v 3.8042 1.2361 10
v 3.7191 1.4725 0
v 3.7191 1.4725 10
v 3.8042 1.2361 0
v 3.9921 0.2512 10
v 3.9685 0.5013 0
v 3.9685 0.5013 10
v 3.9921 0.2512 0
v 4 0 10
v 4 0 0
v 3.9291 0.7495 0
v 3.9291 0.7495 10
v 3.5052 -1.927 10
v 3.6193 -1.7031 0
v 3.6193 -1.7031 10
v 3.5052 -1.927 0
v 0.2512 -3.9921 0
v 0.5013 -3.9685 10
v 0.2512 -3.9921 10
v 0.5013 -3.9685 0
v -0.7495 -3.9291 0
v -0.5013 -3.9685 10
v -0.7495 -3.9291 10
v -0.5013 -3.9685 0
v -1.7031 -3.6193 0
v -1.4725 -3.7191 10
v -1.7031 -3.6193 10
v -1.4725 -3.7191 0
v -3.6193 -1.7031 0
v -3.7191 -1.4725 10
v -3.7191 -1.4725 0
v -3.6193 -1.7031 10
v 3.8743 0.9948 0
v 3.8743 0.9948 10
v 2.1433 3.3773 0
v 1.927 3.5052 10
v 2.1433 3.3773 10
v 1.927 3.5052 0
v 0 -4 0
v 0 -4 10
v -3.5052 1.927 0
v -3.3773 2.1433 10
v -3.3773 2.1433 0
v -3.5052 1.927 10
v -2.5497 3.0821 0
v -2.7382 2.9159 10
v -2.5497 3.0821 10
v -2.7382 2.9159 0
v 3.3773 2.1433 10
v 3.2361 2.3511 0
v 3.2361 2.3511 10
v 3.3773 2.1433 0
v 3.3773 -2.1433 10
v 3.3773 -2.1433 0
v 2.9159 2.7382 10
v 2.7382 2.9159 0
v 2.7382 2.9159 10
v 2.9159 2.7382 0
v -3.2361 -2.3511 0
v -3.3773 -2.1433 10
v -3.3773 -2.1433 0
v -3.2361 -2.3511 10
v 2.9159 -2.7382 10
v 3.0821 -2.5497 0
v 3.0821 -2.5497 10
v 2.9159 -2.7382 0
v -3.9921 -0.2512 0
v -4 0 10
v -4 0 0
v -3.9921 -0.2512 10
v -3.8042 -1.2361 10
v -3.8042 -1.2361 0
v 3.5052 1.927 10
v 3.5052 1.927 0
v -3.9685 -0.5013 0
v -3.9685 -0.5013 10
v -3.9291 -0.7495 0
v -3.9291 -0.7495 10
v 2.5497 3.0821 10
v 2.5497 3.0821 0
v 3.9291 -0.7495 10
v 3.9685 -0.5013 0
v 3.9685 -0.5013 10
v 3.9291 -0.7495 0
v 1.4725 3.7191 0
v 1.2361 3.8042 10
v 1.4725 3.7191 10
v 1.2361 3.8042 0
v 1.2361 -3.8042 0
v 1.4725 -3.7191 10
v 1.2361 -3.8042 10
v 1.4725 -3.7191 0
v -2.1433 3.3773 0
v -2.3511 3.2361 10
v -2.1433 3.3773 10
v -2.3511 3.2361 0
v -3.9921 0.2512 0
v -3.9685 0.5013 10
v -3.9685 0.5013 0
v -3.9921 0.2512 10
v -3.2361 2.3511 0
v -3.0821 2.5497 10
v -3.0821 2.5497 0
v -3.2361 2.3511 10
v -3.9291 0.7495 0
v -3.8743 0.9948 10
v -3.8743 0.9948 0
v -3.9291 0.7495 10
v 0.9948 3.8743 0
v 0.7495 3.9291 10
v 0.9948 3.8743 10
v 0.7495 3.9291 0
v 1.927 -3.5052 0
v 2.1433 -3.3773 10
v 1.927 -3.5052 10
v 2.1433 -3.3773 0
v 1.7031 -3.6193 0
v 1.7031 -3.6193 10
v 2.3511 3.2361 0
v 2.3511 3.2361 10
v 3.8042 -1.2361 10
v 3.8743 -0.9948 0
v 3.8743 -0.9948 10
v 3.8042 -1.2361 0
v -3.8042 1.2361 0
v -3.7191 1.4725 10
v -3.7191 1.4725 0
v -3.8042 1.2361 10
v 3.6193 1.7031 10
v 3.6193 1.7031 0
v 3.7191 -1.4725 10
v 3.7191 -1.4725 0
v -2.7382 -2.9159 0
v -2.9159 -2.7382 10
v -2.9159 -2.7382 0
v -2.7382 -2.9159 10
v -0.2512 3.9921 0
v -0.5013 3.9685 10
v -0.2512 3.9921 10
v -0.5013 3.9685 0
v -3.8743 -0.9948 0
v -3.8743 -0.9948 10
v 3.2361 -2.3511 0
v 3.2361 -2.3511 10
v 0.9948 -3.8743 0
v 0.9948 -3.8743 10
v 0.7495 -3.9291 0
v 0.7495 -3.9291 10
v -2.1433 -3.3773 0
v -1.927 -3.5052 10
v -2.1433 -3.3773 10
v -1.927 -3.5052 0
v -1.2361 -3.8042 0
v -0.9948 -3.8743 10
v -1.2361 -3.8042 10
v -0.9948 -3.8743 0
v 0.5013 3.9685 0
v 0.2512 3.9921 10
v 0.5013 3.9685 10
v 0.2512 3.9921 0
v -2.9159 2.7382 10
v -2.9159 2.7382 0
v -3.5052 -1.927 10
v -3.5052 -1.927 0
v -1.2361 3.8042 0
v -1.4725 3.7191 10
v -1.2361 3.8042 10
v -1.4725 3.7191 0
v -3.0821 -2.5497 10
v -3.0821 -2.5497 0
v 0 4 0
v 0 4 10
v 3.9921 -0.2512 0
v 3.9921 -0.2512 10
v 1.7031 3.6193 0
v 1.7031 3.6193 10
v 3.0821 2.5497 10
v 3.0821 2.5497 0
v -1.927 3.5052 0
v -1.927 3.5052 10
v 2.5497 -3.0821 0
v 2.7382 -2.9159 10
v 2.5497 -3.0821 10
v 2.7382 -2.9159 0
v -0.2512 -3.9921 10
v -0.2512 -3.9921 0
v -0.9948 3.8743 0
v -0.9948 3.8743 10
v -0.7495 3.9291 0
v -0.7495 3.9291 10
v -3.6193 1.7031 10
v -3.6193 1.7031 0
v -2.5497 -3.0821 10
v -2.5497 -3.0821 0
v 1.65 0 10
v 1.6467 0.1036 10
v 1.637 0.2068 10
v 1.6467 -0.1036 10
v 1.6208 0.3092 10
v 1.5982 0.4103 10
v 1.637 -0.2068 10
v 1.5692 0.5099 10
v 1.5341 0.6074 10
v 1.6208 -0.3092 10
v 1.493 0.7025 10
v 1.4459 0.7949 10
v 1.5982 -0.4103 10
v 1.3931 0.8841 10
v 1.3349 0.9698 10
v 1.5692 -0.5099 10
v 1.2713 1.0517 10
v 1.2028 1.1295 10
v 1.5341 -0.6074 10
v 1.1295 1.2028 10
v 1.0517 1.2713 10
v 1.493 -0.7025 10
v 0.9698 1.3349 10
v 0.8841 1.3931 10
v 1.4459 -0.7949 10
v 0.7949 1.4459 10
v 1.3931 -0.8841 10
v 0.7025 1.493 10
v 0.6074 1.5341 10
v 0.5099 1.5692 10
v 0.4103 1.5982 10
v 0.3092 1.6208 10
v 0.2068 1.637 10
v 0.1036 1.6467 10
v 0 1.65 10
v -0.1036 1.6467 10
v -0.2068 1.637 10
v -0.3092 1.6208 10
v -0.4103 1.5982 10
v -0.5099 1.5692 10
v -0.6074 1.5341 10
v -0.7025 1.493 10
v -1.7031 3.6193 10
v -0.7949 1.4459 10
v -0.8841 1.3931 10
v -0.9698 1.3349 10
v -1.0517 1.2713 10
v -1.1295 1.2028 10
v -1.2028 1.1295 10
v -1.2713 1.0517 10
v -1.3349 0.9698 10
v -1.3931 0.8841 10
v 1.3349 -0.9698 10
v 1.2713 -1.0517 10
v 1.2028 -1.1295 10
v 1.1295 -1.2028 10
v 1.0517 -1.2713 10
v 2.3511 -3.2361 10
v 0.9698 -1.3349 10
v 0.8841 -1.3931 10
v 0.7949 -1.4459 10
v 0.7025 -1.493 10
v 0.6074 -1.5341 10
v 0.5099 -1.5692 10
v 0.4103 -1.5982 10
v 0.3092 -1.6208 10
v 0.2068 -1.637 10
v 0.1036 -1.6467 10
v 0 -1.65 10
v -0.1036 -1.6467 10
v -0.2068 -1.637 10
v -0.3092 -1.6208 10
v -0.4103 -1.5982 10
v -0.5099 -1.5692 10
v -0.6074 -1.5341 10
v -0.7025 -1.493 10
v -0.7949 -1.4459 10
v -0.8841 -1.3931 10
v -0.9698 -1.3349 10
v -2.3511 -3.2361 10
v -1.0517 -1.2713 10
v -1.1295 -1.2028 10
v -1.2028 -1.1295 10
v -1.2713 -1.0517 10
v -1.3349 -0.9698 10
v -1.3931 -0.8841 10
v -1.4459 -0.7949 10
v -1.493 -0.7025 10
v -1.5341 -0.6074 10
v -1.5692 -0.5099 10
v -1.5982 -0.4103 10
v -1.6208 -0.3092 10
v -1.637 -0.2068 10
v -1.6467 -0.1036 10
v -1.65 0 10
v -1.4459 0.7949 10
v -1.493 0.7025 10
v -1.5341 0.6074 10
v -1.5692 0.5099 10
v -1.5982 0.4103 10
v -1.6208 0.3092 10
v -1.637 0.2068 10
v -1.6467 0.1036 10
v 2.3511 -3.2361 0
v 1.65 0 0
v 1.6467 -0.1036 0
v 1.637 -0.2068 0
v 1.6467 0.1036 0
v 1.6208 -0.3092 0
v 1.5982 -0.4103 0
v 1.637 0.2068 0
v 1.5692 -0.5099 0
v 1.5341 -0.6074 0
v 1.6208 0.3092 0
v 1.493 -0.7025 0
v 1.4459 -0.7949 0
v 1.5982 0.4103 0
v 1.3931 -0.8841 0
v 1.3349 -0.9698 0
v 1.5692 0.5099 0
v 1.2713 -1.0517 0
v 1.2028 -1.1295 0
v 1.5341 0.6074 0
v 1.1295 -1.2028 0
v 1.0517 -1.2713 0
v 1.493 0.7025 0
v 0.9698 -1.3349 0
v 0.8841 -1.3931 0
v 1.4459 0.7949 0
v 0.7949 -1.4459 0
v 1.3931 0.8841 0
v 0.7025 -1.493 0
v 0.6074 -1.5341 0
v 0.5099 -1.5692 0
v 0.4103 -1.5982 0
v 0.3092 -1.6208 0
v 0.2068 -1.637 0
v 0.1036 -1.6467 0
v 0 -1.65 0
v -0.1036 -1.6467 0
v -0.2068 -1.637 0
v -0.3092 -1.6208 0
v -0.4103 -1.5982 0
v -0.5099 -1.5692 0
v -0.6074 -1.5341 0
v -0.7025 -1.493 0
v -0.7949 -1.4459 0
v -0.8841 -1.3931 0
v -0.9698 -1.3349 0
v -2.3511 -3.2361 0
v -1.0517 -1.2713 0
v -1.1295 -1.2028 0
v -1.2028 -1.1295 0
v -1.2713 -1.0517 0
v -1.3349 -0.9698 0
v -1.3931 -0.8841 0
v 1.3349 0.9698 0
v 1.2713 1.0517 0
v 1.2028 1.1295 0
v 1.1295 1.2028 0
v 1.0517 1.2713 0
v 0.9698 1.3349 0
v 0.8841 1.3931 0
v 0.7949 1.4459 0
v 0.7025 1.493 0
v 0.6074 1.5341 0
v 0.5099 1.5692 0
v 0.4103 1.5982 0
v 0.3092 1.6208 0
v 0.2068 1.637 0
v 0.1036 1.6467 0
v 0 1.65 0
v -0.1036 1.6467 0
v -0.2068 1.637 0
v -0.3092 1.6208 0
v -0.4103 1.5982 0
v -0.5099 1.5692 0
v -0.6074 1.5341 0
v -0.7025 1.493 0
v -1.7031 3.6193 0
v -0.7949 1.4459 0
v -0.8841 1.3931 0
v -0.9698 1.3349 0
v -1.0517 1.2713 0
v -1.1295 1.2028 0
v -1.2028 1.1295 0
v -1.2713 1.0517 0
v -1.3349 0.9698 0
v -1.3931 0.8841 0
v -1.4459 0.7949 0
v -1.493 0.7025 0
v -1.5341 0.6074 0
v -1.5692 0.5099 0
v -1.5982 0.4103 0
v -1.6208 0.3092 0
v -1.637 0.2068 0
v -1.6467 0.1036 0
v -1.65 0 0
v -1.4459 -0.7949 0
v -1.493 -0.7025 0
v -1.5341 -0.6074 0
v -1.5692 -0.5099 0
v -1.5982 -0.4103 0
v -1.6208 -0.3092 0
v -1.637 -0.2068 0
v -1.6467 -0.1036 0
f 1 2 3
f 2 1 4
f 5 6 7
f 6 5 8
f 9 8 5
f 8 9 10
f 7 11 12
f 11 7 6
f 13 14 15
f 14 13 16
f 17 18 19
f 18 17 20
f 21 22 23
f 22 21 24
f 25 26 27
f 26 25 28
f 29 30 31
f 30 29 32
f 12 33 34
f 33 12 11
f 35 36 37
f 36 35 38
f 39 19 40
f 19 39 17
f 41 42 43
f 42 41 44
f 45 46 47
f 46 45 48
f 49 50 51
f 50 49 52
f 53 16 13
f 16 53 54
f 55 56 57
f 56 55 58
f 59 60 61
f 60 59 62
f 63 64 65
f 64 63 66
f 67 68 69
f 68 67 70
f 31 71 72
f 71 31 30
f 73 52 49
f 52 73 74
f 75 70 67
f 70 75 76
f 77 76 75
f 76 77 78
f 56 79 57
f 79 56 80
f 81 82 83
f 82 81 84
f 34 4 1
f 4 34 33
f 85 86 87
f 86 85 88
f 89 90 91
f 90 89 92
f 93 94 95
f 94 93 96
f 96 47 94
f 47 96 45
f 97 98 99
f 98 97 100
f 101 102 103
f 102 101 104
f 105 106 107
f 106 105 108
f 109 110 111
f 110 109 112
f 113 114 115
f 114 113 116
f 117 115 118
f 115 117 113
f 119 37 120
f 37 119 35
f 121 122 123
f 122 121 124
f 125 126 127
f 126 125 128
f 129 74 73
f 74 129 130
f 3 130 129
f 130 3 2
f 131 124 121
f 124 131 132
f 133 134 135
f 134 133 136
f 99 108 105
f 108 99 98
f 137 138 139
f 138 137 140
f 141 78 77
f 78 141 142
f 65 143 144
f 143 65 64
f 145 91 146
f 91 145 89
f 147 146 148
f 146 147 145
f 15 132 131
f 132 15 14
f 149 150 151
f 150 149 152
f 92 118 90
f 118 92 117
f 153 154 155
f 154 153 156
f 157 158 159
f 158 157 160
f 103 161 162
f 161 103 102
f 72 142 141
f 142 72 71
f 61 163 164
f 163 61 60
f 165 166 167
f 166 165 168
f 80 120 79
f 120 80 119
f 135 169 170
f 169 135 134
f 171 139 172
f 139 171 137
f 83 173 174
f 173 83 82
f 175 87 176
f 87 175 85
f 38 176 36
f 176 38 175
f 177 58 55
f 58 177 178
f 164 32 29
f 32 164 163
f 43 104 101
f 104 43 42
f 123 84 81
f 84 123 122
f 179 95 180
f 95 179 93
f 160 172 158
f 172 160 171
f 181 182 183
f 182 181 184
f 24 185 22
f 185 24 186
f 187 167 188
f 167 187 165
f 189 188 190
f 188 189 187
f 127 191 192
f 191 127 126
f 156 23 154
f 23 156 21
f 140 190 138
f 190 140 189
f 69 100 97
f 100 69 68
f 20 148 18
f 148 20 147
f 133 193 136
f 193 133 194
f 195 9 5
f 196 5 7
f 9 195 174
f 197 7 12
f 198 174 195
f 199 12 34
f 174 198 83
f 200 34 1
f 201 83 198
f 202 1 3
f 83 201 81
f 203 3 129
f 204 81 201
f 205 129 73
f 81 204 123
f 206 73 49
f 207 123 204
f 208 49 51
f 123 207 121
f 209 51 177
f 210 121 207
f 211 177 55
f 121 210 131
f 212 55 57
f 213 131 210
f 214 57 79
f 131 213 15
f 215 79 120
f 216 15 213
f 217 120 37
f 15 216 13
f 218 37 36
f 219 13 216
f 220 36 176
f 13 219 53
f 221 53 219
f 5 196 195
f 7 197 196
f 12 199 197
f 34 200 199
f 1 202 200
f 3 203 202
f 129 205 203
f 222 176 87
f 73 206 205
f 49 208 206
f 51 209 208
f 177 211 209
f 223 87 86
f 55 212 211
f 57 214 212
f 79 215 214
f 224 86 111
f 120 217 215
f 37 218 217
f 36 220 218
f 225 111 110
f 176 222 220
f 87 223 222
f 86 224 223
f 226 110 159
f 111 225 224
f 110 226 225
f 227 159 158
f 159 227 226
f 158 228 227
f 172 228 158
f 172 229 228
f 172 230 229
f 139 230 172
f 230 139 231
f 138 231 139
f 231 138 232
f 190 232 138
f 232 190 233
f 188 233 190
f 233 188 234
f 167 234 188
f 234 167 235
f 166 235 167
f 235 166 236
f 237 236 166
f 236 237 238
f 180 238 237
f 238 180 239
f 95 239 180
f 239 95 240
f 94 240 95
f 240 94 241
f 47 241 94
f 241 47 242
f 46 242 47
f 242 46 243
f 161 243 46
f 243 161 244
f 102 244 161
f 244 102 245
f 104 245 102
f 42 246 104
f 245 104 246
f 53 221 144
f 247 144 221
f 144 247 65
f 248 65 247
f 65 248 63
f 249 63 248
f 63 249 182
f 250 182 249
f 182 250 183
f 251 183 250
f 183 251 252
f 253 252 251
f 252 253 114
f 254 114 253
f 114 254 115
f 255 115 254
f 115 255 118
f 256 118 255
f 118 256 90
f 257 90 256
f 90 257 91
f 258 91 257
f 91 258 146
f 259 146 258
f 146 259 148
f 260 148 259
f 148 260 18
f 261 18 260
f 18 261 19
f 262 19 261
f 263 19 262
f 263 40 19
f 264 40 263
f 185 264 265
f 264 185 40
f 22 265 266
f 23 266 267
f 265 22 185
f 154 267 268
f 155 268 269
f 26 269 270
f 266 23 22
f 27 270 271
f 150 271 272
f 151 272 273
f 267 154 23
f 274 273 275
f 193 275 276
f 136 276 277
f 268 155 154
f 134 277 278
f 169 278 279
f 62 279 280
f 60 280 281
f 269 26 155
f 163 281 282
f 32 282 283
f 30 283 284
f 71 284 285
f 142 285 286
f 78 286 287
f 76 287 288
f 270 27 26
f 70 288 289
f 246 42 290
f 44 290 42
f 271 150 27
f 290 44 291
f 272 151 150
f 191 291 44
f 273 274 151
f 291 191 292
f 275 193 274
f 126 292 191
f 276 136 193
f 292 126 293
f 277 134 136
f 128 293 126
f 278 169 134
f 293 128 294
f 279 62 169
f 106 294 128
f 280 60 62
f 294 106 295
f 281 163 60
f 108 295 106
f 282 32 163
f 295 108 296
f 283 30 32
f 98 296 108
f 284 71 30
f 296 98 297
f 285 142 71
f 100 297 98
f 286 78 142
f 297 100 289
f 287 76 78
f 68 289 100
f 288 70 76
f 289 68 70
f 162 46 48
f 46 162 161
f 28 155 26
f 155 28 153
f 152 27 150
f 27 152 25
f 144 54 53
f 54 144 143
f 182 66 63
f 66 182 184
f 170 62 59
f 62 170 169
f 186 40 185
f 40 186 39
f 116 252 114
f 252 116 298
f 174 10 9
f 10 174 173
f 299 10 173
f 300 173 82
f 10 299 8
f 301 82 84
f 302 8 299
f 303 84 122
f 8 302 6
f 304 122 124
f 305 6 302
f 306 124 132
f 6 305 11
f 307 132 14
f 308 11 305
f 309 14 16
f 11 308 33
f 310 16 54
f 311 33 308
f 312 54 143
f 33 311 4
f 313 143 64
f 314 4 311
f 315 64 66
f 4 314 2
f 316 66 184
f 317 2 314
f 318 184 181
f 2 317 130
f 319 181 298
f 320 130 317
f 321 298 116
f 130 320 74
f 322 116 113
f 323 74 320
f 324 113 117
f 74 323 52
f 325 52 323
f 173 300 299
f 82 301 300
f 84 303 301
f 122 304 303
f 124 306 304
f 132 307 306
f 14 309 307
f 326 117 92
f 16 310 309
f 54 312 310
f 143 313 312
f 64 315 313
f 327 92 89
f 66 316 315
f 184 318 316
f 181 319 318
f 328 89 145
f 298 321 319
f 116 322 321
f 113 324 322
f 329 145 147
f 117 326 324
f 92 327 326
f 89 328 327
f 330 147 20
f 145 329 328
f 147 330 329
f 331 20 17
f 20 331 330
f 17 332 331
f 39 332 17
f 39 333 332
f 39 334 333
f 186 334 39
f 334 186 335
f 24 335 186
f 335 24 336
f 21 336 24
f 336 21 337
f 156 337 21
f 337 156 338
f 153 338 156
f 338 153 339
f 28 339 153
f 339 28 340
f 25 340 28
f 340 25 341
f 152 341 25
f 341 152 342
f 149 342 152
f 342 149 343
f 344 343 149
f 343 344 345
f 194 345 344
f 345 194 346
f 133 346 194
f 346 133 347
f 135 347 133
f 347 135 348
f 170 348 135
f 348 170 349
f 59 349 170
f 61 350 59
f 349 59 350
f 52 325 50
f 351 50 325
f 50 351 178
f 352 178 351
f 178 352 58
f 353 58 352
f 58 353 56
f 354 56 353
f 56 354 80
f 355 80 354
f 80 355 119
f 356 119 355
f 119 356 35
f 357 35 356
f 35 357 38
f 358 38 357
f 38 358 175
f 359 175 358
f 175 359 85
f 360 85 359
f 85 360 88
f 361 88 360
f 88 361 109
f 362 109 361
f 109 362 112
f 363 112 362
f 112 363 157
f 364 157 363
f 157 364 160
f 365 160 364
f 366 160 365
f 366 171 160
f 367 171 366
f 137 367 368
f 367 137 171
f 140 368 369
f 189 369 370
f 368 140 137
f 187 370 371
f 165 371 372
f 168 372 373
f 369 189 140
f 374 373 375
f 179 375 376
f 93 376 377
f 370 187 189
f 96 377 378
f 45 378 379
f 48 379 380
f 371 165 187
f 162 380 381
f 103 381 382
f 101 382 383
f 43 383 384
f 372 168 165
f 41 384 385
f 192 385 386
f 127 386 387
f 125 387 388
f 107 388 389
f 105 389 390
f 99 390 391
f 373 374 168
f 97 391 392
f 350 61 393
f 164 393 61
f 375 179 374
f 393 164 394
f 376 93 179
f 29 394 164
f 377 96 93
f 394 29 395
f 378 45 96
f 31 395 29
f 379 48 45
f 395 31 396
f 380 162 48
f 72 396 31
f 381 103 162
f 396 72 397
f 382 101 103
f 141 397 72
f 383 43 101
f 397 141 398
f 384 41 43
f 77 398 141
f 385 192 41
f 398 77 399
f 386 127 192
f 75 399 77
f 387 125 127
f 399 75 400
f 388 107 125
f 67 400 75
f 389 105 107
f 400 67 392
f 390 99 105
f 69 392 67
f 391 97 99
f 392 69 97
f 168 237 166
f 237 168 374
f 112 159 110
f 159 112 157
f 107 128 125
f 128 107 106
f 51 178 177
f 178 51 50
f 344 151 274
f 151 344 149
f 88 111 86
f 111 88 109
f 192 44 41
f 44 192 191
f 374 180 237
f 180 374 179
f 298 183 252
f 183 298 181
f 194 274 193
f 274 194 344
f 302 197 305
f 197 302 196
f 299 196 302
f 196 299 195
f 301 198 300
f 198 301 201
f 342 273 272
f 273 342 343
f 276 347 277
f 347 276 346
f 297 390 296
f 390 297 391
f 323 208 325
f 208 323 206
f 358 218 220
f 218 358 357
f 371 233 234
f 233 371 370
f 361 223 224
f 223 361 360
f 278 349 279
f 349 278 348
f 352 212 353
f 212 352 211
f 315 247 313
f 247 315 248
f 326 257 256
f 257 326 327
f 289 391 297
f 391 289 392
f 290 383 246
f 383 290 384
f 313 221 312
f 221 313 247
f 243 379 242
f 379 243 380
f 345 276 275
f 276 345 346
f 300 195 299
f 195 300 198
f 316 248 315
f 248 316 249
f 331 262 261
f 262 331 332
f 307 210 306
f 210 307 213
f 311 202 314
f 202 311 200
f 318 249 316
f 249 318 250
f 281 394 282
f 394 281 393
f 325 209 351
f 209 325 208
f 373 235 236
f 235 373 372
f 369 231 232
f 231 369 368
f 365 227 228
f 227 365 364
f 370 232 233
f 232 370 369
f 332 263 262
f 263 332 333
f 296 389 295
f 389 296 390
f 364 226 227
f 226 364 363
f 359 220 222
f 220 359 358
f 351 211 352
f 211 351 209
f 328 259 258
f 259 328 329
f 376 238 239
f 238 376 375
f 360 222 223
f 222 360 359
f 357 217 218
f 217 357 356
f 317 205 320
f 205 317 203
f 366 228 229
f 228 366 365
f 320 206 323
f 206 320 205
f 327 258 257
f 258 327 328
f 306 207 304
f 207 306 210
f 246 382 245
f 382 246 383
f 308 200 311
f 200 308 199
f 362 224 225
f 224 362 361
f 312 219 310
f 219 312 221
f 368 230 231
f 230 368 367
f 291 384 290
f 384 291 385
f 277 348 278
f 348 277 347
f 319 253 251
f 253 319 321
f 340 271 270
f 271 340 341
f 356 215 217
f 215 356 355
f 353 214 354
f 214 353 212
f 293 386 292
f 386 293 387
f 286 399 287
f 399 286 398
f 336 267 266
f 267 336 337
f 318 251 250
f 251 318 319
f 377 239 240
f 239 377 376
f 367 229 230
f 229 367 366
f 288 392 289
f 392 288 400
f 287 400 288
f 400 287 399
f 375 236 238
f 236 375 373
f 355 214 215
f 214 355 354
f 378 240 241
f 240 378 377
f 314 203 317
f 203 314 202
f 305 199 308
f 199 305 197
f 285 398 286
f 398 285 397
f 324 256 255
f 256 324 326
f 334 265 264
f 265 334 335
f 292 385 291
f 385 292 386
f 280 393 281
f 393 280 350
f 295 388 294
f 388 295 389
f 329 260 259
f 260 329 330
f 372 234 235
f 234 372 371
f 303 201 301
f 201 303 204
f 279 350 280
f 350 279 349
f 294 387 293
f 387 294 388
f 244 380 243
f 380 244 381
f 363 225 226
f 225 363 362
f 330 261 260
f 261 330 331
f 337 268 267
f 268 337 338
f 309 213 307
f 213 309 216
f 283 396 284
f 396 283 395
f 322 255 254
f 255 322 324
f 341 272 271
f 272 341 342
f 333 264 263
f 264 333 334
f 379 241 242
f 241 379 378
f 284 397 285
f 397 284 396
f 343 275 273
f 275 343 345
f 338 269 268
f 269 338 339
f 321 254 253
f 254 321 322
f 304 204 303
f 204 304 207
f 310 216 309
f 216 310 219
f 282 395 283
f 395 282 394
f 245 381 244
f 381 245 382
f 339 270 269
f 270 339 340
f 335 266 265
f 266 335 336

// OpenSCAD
// [FL_INDEX: keywords="openscad, 3d_parametric, PCB_Stand_Off_Library, csg_solid" | COT="Parametric OpenSCAD design from 3DCodeverse"]
// Title: PCB Stand Off Library

//simple pcb standoff library - By the DoomMeister

/*
Types will be through hole, captured nut, split column (with and without base)

v1 - First Release
v1.1 - Tidied Split Base
v1.2 - added support for end nut
v1.3 - Cleaned up a bit, allowing it to be used as both a customizer object and OpenSCAD library without changes (Marius Kintel <marius@kintel.net>)

This program is free software: you can redistribute it and/or modify
it under the terms of the GNU General Public License as published by
the Free Software Foundation, either version 3 of the License, or
(at your option) any later version.

This program is distributed in the hope that it will be useful,
but WITHOUT ANY WARRANTY; without even the implied warranty of
MERCHANTABILITY or FITNESS FOR A PARTICULAR PURPOSE. See the
GNU General Public License for more details.

You should have received a copy of the GNU General Public License
along with this program. If not, see <http://www.gnu.org/licenses/>.
*/

include<MCAD/metric_fastners.scad>

//>>>>>>>>>>>>>>>>>>>>>>>>>>>>>>>>>>>>>>>>>>>>>>>>>>>>>>>>>>>>>>>>>>>>>>>>>>>
//usage
//>>>>>>>>>>>>>>>>>>>>>>>>>>>>>>>>>>>>>>>>>>>>>>>>>>>>>>>>>>>>>>>>>>>>>>>>>>>
/*
pcb_stand_off(
              type="plain",  THIS IS THE TYPE OF STAND OFF plain, end_nut, split_base 
	      hex=true, 		THIS IS THE OUTSIDE SHAPE IS IT HEXAGONAL OR ROUND,NOT USED ON SPLIT TYPE
	      od = 10, 		OUTSIDE DIAMETER
	      id = 3,        THREAD SIZE FOR INNER DIAMETER, HOLE SIZE FOR SPLIT TYPE
	      len = 12, 		LENGTH, SUPPORT HEIGHT FOR SPLIT TYPE
	      cl=0.3,  		CLEARANCE
	      thk_base,		BASE THICKNESS FOR SPLIT TYPE
	      thk_pcb);		PCB THICKNESS
*/

//>>>>>>>>>>>>>>>>>>>>>>>>>>>>>>>>>>>>>>>>>>>>>>>>>>>>>>>>>>>>>>>>>>>>>>>>>>>
//Customiser Stuff
//>>>>>>>>>>>>>>>>>>>>>>>>>>>>>>>>>>>>>>>>>>>>>>>>>>>>>>>>>>>>>>>>>>>>>>>>>>>

//Plain, Retained Nut or Split Pillar With Base
Stand_Off_Type = "plain"; // [plain:Plain, end_nut:Captive Nut, split_base:Screwless]
//Round or Hex Outside
Outside_Shape = 0; // [0:Circular, 1:Hexagonal]
// in mm
Outside_Diameter = 8;
// Thread Size in mm
Inside_Diameter = 3;
// PCB Spacing
Length = 10;
// PCB hole clearance
Clearance = 0.3;
// screwless variant only
Base_Thickness = 1.5;
// screwless variant only
PCB_Thickness = 1.5;

//Thing
pcb_stand_off(type=Stand_Off_Type,
              hex=Outside_Shape,
              od = Outside_Diameter,
              id = Inside_Diameter,
              len = Length,
              cl=Clearance,
              thk_base=Base_Thickness,
              thk_pcb=PCB_Thickness);

//>>>>>>>>>>>>>>>>>>>>>>>>>>>>>>>>>>>>>>>>>>>>>>>>>>>>>>>>>>>>>>>>>>>>>>>>>>>
//draw test
//>>>>>>>>>>>>>>>>>>>>>>>>>>>>>>>>>>>>>>>>>>>>>>>>>>>>>>>>>>>>>>>>>>>>>>>>>>>
/*
spaceing = 15*1;
translate([0*spaceing,0*spaceing,0])color("red")pcb_stand_off(type="plain",hex=true, od = 10, id = 3, len = 12, cl=0.3,thk_base=3,thk_pcb=1.5);
translate([1*spaceing,0*spaceing,0])color("green")pcb_stand_off(type="end_nut",hex=false, od = 10, id = 3, len = 12, cl=0.3);
translate([1*spaceing,1*spaceing,0])color("blue")pcb_stand_off(type="split_base", od = 10, id = 3, len = 8, cl=0.3, thk_base=1.5,thk_pcb=1.5);
*/

//>>>>>>>>>>>>>>>>>>>>>>>>>>>>>>>>>>>>>>>>>>>>>>>>>>>>>>>>>>>>>>>>>>>>>>>>>>>
//outer module
//>>>>>>>>>>>>>>>>>>>>>>>>>>>>>>>>>>>>>>>>>>>>>>>>>>>>>>>>>>>>>>>>>>>>>>>>>>>

module pcb_stand_off(type="plain",hex=false, od = 8, id = 3, len = 8, cl=0.3,thk_base=3,thk_pcb=1.5)
{
    if (type=="plain") {
	if (hex) stand_off_hex(_od=od, _id = id,_len = len,_cl = cl);
	else stand_off(_od=od, _id = id,_len = len,_cl = cl);
    }
    if (type=="end_nut") {
	if (hex) end_nut_stand_off_hex(_od=od, _id = id,_len = len,_cl = cl);
        else end_nut_stand_off(_od=od, _id = id,_len = len,_cl = cl);
    }
    if (type=="split_base") {
	split_base_stand_off(_od=od, _id = id,_len = len,_cl = cl,_thk_base=thk_base,_thk_pcb=thk_pcb);
    }
}

//>>>>>>>>>>>>>>>>>>>>>>>>>>>>>>>>>>>>>>>>>>>>>>>>>>>>>>>>>>>>>>>>>>>>>>>>>>>
//inner modules
//>>>>>>>>>>>>>>>>>>>>>>>>>>>>>>>>>>>>>>>>>>>>>>>>>>>>>>>>>>>>>>>>>>>>>>>>>>>

module end_nut_stand_off(_od=2, _id = 2,_len = 8,_cl = 0.3)
{
    union() {
	difference() {
	    cylinder(r = _od/2, h = _len, $fn=100);
	    translate([0,0,-1])cylinder(r = (_id + _cl)/2, h = _len+2, $fn=100);
	    translate([0,0,0])flat_nut(_id+_cl,apply_chamfer=false);
	    translate([0,0,_len-(0.8*(_id+_cl))+.01])flat_nut(_id+_cl,apply_chamfer=false);
	}
	translate([0,0,(0.8*(_id+_cl))])cylinder(r = _od/2, h = 0.25, $fn=100);
    }
}
module end_nut_stand_off_hex(_od=2, _id = 2,_len = 8,_cl = 0.3)
{
    union() {
	difference() {
	    cylinder(r = _od/2, h = _len, $fn=6);
	    translate([0,0,-1])cylinder(r = (_id + _cl)/2, h = _len+2, $fn=100);
	    translate([0,0,0])flat_nut(_id+_cl,apply_chamfer=false);
	    translate([0,0,_len-(0.8*(_id+_cl))+.01])flat_nut(_id+_cl,apply_chamfer=false);
	}
	translate([0,0,(0.8*(_id+_cl))])cylinder(r = _od/2, h = 0.25, $fn=6);
    }
}
module stand_off(_od=2, _id = 2,_len = 8,_cl = 0.3)
{
    difference() {
	cylinder(r = _od/2, h = _len, $fn=100);
	translate([0,0,-1])cylinder(r = (_id + _cl)/2, h = _len+2, $fn=100);
    }
}

module stand_off_hex(_od=2, _id = 2,_len = 8,_cl = 0.3)
{
    difference() {
	cylinder(r = _od/2, h = _len, $fn=6);
	translate([0,0,-1])cylinder(r = (_id + _cl)/2, h = _len+2, $fn=100);

    }
}

module split_base_stand_off(_od=12, _id = 2,_len = 8,_cl = 0.3,_thk_base=3,_thk_pcb=1.5)
{
    //tunables
    _top_len = 3;
    _sup_d = 2;
    _sup_ang = 30;
    //extra calcs
    _split_w=_id/3;
    _ol_len = _len+_thk_pcb+_top_len+(2*_cl);
    _sup_len = ((_sup_d/2)/tan(_sup_ang));
    _pil_d = (_id-_cl)/2;
    echo(_sup_len);
    difference() {
	union() {
	    cylinder(r = _od/2, h = _thk_base, $fn=100);
	    cylinder(r = _pil_d, h = _ol_len, $fn=100);
	    translate([0,0,_len-_sup_len])cylinder(r1 = _pil_d, r2 = (_id+_sup_d)/2, h = _sup_len, $fn=100);
	    translate([0,0,_len+_thk_pcb+(_cl)])cylinder(r1 = _pil_d, r2 = (_id+(1.1*_cl))/2, h = _cl, $fn=100);
	    translate([0,0,_len+_thk_pcb+(2*_cl)])cylinder(r1 = (_id+(1.1*_cl))/2, r2 = _pil_d, h = _top_len, $fn=100);
	}
	
	translate([-(_id+_sup_d)/2,-_split_w/2,_len-_sup_len+_split_w])
	cube([_id+_sup_d,_split_w,_sup_len+_thk_pcb+_top_len+_cl]);
	translate([-(_id+_sup_d)/2,0,_len-_sup_len+_split_w])
	rotate([0,90,0])
	cylinder(r=_split_w/2, h=_id+_sup_d, $fn=100);		
    }
}
